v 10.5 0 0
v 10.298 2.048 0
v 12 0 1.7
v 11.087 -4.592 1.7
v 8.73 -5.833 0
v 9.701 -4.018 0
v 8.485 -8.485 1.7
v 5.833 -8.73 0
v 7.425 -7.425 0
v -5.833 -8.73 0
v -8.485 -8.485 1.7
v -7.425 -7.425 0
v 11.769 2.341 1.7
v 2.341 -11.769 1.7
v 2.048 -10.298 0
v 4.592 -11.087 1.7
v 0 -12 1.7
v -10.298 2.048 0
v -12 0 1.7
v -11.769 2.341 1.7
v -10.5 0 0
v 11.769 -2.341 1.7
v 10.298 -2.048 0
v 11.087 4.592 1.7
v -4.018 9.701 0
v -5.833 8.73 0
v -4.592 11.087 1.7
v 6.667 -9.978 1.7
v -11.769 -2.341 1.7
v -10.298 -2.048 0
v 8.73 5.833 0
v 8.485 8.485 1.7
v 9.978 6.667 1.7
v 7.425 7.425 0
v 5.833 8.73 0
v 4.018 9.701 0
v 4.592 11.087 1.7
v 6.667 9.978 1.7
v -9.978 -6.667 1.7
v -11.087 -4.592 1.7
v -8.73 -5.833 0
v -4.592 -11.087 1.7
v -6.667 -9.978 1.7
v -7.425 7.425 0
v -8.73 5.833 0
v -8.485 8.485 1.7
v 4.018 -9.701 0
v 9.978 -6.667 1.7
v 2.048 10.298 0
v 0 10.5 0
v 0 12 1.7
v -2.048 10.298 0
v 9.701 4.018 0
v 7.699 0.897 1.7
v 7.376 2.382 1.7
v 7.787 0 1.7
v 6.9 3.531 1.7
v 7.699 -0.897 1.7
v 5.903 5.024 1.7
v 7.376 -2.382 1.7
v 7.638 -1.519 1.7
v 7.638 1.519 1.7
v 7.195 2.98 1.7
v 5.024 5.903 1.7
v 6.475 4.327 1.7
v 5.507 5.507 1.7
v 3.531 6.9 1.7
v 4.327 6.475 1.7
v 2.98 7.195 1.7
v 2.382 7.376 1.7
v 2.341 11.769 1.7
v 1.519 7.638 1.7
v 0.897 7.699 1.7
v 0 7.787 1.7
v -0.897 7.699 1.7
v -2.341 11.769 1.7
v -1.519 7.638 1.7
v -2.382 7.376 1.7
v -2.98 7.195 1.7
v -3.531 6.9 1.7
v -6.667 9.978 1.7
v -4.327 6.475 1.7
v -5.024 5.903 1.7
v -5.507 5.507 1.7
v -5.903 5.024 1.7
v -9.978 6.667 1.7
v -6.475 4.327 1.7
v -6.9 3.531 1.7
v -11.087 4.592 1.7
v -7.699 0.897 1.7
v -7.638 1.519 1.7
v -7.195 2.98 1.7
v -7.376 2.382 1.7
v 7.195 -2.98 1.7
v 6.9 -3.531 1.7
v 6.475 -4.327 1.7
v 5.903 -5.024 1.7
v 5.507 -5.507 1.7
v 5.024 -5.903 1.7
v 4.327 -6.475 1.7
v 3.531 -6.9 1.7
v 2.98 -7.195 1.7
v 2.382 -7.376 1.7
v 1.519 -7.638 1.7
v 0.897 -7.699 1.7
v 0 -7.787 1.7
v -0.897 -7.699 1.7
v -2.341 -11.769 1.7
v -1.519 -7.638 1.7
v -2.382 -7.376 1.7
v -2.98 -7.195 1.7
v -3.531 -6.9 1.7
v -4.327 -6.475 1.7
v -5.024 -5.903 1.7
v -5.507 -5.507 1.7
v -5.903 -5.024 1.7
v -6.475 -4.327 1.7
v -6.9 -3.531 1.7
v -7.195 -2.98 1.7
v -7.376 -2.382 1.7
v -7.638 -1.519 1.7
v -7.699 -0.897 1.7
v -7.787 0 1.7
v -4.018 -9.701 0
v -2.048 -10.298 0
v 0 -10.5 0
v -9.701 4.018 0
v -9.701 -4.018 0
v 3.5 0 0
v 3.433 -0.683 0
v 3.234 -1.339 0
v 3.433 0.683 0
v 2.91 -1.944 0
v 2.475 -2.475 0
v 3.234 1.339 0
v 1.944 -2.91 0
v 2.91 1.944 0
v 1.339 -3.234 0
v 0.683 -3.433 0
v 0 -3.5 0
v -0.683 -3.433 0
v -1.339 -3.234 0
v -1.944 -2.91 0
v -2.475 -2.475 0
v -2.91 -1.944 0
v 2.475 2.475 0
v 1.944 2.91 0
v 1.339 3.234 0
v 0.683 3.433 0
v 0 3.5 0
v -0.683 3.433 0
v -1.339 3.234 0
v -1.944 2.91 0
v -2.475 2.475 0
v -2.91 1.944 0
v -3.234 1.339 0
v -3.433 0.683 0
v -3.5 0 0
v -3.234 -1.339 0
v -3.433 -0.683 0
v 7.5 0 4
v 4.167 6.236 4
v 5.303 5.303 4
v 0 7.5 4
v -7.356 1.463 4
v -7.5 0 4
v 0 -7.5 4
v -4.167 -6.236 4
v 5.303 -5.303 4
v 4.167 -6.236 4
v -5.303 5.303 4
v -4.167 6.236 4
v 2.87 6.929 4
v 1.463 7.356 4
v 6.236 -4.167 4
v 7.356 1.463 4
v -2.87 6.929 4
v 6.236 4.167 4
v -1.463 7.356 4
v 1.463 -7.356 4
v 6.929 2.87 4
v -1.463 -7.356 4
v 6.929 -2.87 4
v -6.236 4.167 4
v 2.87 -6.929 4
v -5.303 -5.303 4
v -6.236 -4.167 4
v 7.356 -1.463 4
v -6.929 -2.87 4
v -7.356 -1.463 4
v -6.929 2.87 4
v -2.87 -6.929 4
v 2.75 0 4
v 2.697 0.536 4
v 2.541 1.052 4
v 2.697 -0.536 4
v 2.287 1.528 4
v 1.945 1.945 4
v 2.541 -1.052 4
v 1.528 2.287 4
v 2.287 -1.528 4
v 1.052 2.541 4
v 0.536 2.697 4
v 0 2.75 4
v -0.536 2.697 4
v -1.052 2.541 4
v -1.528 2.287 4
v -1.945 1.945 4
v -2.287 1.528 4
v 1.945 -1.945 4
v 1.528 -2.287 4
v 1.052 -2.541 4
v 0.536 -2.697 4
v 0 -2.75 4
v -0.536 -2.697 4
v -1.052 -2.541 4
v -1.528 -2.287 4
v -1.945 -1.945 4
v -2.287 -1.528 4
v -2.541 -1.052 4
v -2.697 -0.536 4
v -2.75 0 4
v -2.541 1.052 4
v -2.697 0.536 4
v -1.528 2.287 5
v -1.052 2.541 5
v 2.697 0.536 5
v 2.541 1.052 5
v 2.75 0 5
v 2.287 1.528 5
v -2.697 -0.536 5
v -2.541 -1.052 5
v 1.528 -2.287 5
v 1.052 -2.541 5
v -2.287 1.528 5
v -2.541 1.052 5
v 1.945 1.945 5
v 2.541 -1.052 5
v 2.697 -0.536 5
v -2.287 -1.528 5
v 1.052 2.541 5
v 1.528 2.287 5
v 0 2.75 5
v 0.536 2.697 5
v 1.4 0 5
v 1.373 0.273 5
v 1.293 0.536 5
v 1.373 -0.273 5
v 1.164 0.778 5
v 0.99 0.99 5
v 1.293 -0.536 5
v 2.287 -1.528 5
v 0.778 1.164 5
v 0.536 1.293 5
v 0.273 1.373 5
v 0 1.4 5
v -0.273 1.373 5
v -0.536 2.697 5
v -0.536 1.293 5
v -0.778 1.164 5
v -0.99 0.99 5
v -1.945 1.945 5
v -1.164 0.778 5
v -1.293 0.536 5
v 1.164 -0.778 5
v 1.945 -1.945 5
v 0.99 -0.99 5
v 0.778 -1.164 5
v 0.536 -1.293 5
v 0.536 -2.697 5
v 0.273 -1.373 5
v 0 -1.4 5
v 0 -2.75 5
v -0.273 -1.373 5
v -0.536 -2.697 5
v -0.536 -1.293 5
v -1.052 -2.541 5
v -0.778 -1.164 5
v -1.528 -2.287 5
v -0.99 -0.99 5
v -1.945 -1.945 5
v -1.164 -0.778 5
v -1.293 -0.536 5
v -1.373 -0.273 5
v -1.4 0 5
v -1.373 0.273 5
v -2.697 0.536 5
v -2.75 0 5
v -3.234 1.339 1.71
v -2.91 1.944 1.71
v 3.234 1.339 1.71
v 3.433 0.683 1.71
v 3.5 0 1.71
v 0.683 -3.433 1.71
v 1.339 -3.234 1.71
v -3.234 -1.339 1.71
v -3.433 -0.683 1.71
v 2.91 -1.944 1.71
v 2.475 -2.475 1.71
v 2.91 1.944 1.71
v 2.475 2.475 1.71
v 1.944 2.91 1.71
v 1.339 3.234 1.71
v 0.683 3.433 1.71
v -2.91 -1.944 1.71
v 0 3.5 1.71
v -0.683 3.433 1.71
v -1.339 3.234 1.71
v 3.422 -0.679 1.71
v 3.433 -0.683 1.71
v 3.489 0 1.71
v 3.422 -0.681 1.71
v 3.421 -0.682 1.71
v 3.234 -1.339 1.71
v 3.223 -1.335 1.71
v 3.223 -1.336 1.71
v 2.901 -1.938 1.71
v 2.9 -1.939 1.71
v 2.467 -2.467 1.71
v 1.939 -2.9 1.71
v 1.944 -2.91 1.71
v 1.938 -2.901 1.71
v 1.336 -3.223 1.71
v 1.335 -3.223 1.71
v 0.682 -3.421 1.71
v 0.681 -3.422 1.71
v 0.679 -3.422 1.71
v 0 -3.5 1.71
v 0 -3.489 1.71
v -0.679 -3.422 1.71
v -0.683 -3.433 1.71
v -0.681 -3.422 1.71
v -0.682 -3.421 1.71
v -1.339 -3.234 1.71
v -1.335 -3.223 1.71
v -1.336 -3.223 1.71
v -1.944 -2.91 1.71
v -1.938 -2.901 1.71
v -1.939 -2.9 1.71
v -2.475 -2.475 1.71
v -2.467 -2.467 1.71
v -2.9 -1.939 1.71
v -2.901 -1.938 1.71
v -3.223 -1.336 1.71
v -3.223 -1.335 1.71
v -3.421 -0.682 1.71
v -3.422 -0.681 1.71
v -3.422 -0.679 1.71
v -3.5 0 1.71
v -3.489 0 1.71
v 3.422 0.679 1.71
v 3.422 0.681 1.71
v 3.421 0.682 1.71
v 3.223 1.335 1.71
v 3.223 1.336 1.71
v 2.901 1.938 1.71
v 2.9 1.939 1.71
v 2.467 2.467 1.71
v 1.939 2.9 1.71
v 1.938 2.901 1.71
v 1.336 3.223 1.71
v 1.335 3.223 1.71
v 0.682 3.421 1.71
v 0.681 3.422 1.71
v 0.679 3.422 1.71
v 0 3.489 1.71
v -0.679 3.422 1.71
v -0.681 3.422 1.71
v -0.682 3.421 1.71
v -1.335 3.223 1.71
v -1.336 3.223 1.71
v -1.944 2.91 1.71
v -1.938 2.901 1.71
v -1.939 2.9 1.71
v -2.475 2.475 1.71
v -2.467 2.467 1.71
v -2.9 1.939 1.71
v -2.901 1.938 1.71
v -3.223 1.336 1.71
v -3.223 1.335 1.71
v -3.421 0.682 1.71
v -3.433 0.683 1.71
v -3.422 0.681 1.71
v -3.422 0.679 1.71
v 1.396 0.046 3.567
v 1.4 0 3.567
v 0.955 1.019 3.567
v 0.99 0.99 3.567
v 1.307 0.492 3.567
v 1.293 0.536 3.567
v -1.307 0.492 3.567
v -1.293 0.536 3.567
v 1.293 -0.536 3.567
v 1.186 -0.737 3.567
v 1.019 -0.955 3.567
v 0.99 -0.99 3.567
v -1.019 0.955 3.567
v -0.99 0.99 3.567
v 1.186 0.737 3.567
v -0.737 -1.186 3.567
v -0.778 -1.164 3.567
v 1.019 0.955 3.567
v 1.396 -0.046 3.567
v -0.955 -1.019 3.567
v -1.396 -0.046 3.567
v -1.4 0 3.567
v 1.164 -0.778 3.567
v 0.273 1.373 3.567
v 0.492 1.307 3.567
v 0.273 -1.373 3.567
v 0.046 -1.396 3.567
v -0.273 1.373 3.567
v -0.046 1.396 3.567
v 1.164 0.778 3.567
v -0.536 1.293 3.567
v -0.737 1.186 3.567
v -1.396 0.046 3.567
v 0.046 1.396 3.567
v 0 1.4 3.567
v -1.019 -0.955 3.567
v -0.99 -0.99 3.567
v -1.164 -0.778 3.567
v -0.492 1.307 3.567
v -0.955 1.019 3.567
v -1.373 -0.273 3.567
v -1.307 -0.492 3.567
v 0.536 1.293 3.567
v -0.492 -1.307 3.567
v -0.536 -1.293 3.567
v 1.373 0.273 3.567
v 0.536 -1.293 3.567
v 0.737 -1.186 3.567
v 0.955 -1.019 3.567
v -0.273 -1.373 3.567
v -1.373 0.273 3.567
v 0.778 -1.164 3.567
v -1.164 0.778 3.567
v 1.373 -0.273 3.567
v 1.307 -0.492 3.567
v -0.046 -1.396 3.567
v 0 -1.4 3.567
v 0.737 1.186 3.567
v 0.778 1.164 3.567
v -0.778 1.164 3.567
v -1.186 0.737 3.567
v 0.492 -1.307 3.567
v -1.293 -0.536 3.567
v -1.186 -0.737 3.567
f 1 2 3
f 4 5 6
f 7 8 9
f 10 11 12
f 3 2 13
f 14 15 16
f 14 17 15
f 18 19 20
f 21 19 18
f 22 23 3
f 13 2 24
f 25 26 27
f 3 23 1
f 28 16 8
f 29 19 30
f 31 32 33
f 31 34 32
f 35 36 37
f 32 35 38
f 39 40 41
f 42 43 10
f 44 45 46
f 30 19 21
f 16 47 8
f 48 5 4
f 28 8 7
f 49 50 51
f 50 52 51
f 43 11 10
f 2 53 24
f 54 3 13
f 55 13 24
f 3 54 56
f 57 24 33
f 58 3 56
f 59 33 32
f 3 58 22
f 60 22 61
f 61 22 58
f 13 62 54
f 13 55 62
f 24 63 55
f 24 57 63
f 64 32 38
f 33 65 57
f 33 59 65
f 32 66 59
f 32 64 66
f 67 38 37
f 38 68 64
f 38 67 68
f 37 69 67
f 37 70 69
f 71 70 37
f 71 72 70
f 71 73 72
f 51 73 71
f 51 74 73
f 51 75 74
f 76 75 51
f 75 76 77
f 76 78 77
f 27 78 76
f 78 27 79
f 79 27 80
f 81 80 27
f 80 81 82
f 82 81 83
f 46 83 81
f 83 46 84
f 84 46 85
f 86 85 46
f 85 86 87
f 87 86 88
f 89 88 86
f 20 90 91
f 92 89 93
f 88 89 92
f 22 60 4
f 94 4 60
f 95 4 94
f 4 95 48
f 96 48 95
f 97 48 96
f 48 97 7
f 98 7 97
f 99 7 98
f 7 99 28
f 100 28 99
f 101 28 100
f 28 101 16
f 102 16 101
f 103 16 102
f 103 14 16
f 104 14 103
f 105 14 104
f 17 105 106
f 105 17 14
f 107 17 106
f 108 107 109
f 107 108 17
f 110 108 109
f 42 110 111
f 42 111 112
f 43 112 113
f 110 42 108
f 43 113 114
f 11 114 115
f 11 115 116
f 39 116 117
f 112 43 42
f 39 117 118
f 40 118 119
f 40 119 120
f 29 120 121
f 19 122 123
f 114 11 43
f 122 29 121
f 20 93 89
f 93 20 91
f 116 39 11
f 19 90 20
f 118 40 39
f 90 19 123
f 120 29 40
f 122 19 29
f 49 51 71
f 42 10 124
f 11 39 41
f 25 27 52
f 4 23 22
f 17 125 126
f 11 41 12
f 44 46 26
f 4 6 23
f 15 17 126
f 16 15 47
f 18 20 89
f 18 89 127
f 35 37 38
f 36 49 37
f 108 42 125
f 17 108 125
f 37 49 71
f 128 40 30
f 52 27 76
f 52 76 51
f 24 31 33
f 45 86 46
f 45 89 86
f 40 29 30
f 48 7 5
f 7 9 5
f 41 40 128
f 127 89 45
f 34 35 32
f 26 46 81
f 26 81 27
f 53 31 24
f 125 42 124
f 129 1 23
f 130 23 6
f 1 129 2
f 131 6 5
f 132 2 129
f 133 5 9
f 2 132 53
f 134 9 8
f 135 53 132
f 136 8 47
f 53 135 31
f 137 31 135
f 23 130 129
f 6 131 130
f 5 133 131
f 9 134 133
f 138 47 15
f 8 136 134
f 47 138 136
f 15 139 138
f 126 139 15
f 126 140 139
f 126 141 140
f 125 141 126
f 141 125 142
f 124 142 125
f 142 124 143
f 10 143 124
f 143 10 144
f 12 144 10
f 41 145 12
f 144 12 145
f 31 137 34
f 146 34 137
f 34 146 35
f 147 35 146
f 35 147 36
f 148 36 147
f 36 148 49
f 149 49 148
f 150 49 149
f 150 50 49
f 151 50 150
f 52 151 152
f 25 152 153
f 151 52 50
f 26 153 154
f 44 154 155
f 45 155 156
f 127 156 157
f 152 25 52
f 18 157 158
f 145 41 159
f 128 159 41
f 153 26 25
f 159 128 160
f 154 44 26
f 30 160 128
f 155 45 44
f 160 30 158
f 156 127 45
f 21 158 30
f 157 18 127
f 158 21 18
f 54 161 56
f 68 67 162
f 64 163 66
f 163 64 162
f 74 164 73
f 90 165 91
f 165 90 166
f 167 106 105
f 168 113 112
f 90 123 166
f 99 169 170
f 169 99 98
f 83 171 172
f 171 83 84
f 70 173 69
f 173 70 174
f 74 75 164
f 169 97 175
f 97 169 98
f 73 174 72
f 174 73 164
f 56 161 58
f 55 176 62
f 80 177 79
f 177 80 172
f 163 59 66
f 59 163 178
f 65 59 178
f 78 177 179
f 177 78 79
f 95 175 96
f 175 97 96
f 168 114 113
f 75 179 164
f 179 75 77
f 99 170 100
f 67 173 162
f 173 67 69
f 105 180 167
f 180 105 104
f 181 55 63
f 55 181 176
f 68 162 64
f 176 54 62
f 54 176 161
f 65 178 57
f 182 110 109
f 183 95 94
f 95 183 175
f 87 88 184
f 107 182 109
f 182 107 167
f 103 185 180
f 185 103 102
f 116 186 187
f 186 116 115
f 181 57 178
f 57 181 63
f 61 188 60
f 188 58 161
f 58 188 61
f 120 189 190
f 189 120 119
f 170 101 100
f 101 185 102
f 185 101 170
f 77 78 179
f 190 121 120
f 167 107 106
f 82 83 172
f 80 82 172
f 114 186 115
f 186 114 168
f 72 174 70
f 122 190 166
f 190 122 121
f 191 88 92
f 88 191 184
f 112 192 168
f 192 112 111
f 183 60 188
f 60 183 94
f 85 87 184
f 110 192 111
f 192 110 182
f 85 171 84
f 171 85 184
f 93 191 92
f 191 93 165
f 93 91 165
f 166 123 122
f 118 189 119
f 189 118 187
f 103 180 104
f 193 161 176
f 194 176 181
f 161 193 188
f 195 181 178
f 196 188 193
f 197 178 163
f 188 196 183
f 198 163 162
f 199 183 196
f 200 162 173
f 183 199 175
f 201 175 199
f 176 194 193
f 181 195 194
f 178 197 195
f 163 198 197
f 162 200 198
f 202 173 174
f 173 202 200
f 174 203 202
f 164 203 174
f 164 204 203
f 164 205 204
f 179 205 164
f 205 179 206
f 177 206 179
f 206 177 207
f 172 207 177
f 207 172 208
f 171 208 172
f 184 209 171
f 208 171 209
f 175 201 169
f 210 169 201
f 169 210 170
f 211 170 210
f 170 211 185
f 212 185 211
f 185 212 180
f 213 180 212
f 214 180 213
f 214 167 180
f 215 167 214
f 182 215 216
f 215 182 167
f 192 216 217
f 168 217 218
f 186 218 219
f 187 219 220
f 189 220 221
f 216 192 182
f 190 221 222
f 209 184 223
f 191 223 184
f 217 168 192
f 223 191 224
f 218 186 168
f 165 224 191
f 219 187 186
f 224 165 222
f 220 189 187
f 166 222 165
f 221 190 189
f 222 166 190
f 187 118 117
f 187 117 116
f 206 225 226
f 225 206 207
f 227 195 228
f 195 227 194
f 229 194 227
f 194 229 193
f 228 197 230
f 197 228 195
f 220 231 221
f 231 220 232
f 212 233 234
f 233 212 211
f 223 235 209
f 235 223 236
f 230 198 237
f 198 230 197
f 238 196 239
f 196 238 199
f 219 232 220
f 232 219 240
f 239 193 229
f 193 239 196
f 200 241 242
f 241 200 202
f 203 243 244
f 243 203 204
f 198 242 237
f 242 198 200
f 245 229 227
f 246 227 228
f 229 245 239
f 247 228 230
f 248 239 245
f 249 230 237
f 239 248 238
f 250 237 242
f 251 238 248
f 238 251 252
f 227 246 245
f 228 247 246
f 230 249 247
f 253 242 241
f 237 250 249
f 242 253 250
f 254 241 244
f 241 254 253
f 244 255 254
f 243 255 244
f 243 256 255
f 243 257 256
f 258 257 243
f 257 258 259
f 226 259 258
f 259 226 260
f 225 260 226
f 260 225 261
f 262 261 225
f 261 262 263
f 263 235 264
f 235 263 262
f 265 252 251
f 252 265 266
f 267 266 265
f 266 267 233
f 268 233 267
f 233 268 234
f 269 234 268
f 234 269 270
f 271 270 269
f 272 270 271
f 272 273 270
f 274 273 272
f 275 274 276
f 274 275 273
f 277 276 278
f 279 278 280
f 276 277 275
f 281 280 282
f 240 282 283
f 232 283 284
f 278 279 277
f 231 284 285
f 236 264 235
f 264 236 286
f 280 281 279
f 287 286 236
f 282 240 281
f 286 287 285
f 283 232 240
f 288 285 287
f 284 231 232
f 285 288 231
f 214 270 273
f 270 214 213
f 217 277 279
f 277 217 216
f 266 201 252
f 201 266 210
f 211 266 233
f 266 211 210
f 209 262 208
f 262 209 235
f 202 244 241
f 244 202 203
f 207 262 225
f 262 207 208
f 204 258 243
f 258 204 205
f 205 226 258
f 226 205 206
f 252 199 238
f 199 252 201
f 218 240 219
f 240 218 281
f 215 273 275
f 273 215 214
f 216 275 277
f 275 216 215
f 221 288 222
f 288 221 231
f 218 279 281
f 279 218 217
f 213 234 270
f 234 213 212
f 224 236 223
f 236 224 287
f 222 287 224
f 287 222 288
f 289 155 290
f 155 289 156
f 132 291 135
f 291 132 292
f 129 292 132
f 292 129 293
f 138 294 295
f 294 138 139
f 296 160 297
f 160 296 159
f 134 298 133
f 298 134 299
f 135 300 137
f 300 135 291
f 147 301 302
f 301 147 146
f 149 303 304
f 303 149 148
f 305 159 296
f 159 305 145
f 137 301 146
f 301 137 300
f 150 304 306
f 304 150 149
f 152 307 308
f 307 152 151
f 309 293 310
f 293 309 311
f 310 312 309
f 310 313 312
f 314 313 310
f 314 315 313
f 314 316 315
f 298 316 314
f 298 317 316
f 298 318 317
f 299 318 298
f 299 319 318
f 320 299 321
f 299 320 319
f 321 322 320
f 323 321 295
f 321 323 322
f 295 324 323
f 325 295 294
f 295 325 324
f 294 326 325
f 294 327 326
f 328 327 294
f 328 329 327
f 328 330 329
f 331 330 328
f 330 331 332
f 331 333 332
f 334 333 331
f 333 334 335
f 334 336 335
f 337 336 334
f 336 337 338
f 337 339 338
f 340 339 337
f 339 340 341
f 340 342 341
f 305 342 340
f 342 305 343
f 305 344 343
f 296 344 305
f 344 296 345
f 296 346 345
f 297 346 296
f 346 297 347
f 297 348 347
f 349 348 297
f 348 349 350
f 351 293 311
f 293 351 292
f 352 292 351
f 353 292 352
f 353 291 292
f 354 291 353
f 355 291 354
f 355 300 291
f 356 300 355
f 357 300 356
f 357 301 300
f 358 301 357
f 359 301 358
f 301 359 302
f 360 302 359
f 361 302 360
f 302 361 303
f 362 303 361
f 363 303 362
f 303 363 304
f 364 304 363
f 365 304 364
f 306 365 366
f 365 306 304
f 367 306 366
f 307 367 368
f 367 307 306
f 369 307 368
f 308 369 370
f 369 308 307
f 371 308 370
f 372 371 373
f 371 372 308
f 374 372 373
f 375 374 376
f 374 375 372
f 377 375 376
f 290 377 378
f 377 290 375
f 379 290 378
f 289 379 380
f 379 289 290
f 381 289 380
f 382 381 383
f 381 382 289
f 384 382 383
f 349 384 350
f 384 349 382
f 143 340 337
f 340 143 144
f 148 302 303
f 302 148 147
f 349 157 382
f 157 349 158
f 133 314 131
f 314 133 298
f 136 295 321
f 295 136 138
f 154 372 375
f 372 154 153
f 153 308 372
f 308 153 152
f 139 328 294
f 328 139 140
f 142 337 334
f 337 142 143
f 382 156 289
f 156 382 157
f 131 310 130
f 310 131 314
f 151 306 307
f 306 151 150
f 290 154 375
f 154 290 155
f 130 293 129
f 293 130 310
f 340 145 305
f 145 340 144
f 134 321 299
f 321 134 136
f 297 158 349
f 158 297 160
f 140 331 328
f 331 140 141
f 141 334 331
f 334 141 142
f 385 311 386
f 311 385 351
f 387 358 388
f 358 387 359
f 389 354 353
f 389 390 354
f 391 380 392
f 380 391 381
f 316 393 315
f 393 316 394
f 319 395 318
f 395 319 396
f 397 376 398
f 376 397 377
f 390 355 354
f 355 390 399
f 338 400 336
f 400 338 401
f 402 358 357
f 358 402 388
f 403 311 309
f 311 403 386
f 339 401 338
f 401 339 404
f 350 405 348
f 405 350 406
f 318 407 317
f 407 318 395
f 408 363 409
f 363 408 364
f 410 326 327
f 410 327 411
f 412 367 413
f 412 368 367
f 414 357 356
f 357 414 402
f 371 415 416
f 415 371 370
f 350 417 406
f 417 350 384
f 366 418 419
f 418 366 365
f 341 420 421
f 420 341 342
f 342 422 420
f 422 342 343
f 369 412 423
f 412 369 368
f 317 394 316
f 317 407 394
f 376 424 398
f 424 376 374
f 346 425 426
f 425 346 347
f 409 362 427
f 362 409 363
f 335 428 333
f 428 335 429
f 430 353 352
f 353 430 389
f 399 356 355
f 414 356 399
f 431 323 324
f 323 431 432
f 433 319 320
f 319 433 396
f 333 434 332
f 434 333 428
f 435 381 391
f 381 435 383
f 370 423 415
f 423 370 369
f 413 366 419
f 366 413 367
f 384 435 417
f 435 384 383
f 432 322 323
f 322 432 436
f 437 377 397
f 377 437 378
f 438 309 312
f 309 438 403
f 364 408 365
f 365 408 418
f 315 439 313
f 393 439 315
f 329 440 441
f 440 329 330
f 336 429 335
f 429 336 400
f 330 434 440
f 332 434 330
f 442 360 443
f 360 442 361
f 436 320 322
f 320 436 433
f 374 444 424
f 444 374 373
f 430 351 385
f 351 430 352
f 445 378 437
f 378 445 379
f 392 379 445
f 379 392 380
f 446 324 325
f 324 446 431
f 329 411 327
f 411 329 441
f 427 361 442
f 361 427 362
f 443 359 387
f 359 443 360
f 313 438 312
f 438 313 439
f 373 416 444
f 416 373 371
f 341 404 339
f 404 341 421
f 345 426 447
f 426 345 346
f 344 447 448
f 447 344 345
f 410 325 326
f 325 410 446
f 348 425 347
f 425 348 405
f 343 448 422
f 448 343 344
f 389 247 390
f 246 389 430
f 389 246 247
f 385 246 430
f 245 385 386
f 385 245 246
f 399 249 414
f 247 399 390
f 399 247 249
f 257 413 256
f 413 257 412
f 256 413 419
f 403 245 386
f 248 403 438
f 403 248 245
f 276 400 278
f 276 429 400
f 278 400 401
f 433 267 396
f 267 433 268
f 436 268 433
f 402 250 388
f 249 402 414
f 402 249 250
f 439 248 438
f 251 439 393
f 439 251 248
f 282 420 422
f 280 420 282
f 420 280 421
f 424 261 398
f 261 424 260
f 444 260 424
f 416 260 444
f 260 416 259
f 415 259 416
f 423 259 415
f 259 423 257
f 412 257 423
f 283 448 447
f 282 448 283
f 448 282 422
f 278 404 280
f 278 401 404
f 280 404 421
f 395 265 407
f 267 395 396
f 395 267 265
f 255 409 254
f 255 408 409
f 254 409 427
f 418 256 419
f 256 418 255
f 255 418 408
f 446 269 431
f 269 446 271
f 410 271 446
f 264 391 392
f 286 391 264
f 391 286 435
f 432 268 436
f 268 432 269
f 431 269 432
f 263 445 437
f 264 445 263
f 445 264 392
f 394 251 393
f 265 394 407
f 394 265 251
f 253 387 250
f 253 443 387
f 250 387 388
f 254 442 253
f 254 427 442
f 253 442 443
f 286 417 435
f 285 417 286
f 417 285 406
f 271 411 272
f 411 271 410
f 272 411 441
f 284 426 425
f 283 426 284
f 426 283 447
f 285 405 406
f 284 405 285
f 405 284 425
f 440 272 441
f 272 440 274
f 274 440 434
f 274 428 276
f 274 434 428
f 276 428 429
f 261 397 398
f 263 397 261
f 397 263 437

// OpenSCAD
$fn=32;
difference(){
    union(){
        cylinder(d1=21, d2=24, h=1.7);
        cylinder(d1=16, d2=15, h=4);
        cylinder(d=5.5, h=5);
    }
    translate([0,0,-0.01])
        cylinder(d = 7, h=1.72);
    translate([0,0,1.7])
        cylinder(d1 = 7, d2=2.5, h=2);
    cylinder(d=2.8, h=20);
    if($preview) cube(20);
}
